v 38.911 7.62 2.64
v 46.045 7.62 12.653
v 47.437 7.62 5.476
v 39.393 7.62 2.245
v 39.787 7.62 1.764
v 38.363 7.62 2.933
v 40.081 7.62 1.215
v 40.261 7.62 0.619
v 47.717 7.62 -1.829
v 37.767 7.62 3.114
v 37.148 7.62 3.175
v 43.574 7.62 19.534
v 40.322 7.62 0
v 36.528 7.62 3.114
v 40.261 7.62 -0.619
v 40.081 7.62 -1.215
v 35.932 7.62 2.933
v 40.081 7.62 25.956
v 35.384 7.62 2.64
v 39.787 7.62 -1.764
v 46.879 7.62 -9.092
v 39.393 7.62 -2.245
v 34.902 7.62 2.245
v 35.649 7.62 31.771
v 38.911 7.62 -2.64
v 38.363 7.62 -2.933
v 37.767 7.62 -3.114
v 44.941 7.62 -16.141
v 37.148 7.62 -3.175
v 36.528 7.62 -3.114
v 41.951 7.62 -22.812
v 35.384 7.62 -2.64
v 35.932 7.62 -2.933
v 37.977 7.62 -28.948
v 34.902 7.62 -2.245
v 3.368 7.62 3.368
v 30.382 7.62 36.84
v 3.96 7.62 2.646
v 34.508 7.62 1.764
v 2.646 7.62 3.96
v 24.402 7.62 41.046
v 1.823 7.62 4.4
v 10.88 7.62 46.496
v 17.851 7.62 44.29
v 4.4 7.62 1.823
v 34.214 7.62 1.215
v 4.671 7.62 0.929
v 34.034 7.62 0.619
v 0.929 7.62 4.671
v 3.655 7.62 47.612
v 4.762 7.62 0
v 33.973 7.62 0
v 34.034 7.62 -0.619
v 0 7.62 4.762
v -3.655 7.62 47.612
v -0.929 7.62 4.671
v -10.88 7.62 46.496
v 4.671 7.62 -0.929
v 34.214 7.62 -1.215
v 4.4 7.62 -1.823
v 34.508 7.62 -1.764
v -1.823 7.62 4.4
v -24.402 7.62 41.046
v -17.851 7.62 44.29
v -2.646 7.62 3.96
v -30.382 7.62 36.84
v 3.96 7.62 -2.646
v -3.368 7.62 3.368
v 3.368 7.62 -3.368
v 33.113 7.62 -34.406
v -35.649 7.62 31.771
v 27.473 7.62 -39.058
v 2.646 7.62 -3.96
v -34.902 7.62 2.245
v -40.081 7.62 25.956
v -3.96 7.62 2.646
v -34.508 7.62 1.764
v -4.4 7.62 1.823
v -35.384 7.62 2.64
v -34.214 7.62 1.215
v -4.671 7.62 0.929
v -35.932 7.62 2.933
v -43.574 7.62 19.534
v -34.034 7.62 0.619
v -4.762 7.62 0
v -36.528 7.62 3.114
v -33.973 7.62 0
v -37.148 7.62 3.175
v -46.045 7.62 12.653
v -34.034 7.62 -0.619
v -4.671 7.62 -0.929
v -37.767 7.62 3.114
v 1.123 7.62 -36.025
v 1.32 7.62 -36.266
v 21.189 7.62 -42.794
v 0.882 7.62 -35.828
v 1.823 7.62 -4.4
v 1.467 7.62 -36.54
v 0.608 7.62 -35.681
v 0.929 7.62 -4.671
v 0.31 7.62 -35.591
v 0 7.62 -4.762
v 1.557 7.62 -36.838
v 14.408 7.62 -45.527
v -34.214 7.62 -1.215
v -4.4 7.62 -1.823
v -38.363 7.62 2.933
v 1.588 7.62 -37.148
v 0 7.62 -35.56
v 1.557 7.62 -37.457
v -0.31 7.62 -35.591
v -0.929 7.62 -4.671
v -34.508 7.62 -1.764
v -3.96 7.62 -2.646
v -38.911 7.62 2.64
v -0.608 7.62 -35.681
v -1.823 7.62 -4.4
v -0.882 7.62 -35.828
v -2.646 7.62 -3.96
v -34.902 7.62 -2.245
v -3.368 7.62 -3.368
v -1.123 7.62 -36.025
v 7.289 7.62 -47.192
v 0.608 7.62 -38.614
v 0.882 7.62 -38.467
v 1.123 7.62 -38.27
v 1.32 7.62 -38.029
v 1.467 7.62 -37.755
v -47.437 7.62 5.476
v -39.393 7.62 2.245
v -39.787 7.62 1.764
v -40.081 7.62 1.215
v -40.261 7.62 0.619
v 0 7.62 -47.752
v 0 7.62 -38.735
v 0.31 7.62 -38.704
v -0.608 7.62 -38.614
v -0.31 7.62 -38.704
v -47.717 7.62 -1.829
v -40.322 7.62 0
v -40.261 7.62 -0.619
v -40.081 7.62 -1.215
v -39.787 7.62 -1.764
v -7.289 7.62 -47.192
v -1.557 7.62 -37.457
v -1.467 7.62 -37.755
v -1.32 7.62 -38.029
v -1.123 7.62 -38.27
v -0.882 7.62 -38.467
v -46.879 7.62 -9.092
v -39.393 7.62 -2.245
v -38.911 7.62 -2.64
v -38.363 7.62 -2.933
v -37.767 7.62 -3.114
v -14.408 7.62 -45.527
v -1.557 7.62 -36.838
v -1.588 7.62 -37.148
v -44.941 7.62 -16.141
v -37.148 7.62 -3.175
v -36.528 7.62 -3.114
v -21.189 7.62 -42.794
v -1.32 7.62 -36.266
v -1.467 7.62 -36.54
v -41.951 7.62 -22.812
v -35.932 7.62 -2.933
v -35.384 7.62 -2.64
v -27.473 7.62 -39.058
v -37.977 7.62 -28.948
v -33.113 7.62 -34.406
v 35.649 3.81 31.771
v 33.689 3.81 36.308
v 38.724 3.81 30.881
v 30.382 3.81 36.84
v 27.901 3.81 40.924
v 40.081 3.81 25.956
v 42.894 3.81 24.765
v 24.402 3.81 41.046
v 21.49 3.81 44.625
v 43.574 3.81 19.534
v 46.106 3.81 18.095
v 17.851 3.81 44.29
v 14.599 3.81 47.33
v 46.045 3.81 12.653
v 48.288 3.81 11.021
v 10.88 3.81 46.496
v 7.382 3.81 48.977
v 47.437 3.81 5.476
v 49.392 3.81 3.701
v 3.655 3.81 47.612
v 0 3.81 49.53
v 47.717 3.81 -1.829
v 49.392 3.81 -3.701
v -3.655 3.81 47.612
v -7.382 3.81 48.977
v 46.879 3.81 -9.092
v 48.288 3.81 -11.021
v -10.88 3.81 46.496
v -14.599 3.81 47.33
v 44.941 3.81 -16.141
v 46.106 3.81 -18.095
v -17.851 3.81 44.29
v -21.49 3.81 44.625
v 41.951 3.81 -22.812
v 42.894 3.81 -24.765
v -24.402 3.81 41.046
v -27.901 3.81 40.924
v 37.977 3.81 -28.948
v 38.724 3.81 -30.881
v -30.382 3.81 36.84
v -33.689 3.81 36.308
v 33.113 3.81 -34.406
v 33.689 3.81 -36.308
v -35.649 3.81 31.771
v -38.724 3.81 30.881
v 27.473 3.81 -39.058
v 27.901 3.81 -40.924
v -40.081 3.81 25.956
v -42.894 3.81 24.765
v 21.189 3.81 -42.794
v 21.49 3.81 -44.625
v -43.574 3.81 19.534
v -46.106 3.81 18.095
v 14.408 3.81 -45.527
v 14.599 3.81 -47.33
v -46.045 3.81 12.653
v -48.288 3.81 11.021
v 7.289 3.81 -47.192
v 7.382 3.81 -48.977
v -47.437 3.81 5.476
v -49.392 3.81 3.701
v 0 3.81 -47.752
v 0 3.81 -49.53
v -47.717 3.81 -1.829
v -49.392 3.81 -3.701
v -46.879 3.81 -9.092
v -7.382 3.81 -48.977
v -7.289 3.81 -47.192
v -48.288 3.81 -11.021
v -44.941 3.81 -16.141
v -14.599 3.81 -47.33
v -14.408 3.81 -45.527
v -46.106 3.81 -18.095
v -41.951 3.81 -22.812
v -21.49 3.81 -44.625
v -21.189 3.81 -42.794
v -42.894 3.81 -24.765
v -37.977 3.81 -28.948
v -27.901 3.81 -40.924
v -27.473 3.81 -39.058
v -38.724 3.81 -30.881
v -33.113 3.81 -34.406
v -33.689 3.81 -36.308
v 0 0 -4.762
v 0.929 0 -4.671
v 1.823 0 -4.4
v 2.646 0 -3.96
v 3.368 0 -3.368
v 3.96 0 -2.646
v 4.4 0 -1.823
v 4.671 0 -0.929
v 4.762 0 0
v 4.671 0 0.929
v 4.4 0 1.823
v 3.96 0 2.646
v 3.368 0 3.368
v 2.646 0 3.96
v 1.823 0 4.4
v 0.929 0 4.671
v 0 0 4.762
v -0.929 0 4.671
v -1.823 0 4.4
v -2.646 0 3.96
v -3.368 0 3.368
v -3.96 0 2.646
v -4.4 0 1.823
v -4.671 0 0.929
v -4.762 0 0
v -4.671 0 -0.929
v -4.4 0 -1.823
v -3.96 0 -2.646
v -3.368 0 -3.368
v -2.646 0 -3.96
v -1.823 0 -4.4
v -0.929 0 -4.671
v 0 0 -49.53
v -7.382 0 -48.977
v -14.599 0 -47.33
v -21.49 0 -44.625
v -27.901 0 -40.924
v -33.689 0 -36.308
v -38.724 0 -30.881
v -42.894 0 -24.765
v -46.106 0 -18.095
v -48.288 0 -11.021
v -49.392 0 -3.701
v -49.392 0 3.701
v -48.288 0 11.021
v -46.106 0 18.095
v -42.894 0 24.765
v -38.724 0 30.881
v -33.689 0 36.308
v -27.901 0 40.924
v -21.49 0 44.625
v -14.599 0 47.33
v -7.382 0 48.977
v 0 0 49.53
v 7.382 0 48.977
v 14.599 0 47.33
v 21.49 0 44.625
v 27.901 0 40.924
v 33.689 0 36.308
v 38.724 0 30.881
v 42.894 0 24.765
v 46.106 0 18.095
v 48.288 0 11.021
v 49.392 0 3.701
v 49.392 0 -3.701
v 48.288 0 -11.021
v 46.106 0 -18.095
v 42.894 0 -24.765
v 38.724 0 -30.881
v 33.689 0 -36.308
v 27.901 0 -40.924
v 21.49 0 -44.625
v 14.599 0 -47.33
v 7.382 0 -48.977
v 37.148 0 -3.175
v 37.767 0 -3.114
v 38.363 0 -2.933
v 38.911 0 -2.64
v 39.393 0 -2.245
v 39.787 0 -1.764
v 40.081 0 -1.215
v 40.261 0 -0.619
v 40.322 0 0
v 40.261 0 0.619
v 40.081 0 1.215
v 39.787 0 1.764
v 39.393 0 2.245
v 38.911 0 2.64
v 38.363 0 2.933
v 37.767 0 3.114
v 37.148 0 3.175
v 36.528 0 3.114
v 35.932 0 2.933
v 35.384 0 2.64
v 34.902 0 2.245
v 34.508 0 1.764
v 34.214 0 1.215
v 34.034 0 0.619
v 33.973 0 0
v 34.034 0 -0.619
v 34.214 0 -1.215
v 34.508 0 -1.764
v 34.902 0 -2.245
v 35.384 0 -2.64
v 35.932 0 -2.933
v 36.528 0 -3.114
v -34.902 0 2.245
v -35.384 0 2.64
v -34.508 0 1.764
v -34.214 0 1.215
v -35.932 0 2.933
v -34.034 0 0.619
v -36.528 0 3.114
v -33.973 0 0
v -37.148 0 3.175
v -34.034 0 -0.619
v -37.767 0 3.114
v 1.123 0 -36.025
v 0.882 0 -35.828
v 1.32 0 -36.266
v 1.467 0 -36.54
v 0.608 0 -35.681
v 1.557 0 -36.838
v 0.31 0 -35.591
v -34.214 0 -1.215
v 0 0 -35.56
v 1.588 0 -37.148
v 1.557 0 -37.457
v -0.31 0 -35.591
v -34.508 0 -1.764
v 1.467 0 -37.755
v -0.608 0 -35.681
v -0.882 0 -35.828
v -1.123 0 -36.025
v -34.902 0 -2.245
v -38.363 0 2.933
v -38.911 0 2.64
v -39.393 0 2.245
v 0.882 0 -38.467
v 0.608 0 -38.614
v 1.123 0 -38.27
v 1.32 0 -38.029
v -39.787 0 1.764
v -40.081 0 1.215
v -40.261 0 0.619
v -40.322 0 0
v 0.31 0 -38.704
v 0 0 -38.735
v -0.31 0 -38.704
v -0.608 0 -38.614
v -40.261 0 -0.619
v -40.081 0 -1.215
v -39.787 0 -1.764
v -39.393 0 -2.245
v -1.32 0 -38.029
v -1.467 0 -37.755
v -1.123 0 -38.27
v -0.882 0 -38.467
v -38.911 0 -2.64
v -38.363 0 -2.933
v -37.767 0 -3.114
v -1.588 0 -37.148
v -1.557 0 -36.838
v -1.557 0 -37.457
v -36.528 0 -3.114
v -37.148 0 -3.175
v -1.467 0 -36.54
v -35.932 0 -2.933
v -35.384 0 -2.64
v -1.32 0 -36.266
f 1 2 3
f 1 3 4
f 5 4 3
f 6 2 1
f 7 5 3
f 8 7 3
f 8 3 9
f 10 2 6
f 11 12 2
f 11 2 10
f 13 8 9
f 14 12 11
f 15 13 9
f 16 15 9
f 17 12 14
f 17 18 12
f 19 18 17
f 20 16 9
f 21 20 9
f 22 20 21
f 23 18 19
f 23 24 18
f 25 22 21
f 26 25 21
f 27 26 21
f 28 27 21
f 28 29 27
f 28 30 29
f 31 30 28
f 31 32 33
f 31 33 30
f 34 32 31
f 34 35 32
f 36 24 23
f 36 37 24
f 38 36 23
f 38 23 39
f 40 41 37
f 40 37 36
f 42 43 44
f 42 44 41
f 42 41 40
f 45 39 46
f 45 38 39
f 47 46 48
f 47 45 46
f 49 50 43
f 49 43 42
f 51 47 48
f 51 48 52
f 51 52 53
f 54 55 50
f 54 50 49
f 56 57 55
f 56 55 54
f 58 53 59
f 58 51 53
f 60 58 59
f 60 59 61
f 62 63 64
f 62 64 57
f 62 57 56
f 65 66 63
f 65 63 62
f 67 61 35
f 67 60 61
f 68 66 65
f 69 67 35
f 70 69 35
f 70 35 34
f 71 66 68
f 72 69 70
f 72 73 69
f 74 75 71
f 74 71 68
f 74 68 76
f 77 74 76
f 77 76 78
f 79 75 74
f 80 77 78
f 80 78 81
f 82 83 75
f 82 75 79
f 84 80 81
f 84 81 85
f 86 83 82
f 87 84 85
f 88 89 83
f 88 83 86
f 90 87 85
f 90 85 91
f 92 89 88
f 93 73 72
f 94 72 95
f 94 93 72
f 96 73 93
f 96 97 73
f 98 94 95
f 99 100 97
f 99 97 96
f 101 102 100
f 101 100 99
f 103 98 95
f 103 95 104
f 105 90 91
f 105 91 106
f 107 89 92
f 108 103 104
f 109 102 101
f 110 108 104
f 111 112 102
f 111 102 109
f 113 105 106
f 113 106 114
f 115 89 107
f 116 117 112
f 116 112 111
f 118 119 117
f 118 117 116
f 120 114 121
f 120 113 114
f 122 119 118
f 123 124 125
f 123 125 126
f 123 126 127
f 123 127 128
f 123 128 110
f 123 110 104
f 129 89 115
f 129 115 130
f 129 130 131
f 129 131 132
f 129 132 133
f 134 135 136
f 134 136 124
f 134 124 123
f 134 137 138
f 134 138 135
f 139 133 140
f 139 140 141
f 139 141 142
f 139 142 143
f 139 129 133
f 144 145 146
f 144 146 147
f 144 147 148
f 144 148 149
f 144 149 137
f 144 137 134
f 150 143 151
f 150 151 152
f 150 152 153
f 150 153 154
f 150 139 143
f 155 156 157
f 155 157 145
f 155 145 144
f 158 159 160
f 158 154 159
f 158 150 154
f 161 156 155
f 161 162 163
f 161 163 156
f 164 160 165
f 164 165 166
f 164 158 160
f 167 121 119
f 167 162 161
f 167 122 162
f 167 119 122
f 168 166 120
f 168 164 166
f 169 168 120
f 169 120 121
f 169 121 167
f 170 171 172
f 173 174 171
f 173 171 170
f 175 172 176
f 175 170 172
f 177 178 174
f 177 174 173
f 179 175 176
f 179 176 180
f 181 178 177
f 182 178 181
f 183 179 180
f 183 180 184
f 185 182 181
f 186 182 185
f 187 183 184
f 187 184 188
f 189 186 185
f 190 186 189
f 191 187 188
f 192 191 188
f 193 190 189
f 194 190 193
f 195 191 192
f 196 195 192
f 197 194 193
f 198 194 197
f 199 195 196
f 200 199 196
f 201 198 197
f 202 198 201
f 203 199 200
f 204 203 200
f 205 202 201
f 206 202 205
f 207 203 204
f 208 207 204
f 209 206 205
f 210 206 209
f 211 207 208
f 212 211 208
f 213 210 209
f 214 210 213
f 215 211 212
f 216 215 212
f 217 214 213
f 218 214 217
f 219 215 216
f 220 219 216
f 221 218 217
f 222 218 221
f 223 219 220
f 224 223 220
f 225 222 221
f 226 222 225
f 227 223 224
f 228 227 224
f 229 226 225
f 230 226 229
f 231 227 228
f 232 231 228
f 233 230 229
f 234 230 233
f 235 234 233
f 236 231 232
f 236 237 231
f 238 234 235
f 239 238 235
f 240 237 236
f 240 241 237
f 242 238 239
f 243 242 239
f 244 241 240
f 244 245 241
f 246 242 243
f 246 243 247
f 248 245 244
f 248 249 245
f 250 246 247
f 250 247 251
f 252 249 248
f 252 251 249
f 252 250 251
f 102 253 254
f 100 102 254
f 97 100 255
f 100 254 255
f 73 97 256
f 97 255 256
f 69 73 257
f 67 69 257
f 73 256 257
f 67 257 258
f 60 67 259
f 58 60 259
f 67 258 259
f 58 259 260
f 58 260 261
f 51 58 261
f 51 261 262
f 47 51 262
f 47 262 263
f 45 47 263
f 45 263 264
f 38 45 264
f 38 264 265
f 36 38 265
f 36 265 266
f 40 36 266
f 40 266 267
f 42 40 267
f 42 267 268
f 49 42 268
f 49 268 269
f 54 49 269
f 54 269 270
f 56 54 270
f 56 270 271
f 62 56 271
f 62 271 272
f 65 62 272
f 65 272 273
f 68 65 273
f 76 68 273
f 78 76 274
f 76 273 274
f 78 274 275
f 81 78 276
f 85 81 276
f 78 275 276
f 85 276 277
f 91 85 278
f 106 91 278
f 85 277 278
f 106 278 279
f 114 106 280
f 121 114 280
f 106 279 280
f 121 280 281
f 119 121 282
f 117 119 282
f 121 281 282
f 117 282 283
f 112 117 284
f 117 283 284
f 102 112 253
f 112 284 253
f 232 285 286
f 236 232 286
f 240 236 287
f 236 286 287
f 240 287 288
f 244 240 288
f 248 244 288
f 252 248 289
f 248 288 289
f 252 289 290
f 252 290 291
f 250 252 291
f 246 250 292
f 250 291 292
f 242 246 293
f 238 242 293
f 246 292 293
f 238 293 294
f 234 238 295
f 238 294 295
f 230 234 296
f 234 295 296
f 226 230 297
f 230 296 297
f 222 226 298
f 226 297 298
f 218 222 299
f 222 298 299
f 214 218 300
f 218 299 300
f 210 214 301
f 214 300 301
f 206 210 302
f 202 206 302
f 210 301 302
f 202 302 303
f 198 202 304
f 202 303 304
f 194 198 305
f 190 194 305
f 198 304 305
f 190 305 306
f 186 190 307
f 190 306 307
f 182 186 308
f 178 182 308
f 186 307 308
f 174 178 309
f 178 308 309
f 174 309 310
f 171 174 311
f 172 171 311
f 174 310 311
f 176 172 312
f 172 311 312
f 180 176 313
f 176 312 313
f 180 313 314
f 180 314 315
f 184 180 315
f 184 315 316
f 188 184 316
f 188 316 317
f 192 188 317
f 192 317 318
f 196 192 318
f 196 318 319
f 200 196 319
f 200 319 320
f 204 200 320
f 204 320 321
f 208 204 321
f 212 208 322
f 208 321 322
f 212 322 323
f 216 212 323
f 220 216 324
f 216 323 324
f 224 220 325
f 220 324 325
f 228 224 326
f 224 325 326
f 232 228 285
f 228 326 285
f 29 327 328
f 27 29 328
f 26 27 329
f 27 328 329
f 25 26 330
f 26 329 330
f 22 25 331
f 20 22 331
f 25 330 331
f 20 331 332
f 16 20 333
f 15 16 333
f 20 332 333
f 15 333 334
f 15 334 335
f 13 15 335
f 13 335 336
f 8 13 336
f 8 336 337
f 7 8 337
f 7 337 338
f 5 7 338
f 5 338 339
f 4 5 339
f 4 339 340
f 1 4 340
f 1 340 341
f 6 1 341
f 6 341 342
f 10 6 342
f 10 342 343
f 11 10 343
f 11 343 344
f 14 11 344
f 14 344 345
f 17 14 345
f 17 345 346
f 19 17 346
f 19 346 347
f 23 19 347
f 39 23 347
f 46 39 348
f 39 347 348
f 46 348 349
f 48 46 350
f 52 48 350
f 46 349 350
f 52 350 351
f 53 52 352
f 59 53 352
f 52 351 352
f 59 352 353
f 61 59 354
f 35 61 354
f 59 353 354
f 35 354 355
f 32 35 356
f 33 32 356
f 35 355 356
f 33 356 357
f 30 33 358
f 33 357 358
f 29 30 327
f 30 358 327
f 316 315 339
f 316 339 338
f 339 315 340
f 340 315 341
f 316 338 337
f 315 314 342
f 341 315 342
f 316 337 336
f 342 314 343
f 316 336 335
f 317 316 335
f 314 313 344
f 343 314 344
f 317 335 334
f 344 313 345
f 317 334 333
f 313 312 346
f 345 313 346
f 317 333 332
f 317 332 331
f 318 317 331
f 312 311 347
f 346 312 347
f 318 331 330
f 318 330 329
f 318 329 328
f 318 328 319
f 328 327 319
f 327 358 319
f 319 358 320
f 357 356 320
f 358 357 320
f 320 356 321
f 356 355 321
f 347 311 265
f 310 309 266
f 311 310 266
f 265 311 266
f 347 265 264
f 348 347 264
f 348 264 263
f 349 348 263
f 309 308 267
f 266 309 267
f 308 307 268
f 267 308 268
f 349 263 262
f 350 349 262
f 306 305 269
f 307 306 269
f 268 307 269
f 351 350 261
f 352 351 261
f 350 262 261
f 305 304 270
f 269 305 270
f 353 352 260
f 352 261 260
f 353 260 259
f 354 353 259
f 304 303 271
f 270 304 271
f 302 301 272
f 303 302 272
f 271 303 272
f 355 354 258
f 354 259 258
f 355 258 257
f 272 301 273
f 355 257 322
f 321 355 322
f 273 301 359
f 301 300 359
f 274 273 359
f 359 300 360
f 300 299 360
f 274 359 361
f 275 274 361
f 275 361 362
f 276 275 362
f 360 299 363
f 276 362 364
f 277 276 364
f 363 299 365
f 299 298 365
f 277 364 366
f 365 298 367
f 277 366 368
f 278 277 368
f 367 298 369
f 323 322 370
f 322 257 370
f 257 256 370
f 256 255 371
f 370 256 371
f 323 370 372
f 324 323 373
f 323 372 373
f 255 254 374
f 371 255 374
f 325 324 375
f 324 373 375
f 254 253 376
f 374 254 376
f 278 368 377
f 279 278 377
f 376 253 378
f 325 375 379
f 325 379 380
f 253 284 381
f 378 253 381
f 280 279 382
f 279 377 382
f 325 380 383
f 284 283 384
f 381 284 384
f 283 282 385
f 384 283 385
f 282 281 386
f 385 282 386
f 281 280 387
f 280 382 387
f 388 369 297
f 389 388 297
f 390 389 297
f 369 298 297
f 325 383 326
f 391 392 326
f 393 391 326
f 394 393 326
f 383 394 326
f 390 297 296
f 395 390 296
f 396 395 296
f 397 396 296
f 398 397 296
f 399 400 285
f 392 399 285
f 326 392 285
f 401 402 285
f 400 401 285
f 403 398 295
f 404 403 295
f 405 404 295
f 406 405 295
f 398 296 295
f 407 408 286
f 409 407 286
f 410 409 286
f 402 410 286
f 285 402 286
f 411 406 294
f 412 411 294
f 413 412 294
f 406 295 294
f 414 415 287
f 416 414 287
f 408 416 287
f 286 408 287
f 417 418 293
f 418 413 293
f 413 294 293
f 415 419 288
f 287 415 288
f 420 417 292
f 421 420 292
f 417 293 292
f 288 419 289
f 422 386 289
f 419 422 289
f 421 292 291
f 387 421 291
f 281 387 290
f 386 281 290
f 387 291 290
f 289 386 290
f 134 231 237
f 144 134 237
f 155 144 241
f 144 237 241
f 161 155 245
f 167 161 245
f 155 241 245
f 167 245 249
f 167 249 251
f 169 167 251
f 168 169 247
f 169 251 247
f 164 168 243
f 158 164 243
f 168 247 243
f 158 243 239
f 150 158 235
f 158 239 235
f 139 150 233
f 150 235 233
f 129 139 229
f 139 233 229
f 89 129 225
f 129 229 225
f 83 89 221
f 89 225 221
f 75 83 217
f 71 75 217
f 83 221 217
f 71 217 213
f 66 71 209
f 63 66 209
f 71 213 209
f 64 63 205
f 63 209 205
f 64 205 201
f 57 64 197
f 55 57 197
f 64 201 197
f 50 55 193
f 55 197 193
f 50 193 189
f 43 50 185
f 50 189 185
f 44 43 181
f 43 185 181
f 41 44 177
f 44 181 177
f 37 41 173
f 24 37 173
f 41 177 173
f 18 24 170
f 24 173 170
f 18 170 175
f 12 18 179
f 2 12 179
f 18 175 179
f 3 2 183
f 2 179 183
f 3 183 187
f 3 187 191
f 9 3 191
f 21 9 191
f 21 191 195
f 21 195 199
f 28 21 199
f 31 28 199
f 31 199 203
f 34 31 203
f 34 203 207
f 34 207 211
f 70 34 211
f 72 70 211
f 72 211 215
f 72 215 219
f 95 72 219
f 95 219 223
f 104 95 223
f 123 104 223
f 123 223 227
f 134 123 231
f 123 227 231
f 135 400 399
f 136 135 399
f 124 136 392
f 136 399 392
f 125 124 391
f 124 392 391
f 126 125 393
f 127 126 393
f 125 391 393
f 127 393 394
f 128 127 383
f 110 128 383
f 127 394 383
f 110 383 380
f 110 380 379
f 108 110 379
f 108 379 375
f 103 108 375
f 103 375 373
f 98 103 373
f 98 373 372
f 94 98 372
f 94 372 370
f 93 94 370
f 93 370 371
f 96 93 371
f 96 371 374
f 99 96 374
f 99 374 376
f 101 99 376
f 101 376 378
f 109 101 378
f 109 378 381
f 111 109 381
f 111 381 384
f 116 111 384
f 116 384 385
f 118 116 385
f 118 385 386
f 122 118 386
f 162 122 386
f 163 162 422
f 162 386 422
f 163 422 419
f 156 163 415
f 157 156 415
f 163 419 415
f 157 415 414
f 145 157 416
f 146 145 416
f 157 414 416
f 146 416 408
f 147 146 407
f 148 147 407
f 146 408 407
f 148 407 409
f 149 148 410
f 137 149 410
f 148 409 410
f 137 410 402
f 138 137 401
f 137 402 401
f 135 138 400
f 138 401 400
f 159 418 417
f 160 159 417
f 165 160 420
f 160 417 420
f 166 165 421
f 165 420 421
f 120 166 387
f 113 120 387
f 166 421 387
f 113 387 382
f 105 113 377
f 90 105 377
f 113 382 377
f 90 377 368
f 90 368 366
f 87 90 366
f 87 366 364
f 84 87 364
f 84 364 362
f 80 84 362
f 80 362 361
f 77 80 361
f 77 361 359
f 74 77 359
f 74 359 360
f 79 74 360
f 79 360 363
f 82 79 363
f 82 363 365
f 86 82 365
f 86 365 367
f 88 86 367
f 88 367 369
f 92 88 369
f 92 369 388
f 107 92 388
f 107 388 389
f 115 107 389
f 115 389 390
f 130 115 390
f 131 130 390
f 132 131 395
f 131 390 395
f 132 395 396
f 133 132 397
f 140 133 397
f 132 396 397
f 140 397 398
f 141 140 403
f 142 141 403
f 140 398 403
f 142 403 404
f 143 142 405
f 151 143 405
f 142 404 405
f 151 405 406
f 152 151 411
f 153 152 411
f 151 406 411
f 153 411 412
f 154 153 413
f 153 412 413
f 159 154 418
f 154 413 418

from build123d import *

# Parameters (mm, degrees)
SKETCH9_R           = 49.53
BOSS_EXTRUDE1_DEPTH = 3.81
SKETCH10_R          = 47.752
BOSS_EXTRUDE2_DEPTH = 3.81
SKETCH11_R          = 3.175
SKETCH11_R_2        = 4.7625
CUT_EXTRUDE1_DEPTH  = 10.922
SKETCH11_3_R        = 3.175
SKETCH11_3_R_2      = 1.5875
CUT_EXTRUDE2_DEPTH  = 40.64


with BuildPart() as part:
    # Sketch9 → Boss-Extrude1 (new body)
    with BuildSketch(Plane(origin=(0, 0, 0), x_dir=(1, 0, 0), z_dir=(0, 1, 0))):
        Circle(SKETCH9_R)
    extrude(amount=BOSS_EXTRUDE1_DEPTH)

    # Sketch10 → Boss-Extrude2 (add)
    with BuildSketch(Plane(origin=(0, 3.81, 0), x_dir=(1, 0, 0), z_dir=(0, 1, 0))):
        Circle(SKETCH10_R)
    extrude(amount=BOSS_EXTRUDE2_DEPTH)

    # Sketch11 → Cut-Extrude1 (cut)
    with BuildSketch(Plane(origin=(0, 0, 0), x_dir=(-1, 0, 0), z_dir=(0, -1, 0))):
        with Locations((37.1475, 0)):
            Circle(SKETCH11_R)
        with Locations((-37.1475, 0)):
            Circle(SKETCH11_R)
        Circle(SKETCH11_R_2)
    extrude(amount=-CUT_EXTRUDE1_DEPTH, mode=Mode.SUBTRACT)

    # Sketch11<3> → Cut-Extrude2 (cut)
    with BuildSketch(Plane(origin=(0, 0, 0), x_dir=(-1, 0, 0), z_dir=(0, -1, 0))):
        with Locations((37.1475, 0)):
            Circle(SKETCH11_3_R)
        with Locations((0, 37.1475)):
            Circle(SKETCH11_3_R_2)
        with Locations((-37.1475, 0)):
            Circle(SKETCH11_3_R)
    extrude(amount=-CUT_EXTRUDE2_DEPTH, mode=Mode.SUBTRACT)


solid = part.part
